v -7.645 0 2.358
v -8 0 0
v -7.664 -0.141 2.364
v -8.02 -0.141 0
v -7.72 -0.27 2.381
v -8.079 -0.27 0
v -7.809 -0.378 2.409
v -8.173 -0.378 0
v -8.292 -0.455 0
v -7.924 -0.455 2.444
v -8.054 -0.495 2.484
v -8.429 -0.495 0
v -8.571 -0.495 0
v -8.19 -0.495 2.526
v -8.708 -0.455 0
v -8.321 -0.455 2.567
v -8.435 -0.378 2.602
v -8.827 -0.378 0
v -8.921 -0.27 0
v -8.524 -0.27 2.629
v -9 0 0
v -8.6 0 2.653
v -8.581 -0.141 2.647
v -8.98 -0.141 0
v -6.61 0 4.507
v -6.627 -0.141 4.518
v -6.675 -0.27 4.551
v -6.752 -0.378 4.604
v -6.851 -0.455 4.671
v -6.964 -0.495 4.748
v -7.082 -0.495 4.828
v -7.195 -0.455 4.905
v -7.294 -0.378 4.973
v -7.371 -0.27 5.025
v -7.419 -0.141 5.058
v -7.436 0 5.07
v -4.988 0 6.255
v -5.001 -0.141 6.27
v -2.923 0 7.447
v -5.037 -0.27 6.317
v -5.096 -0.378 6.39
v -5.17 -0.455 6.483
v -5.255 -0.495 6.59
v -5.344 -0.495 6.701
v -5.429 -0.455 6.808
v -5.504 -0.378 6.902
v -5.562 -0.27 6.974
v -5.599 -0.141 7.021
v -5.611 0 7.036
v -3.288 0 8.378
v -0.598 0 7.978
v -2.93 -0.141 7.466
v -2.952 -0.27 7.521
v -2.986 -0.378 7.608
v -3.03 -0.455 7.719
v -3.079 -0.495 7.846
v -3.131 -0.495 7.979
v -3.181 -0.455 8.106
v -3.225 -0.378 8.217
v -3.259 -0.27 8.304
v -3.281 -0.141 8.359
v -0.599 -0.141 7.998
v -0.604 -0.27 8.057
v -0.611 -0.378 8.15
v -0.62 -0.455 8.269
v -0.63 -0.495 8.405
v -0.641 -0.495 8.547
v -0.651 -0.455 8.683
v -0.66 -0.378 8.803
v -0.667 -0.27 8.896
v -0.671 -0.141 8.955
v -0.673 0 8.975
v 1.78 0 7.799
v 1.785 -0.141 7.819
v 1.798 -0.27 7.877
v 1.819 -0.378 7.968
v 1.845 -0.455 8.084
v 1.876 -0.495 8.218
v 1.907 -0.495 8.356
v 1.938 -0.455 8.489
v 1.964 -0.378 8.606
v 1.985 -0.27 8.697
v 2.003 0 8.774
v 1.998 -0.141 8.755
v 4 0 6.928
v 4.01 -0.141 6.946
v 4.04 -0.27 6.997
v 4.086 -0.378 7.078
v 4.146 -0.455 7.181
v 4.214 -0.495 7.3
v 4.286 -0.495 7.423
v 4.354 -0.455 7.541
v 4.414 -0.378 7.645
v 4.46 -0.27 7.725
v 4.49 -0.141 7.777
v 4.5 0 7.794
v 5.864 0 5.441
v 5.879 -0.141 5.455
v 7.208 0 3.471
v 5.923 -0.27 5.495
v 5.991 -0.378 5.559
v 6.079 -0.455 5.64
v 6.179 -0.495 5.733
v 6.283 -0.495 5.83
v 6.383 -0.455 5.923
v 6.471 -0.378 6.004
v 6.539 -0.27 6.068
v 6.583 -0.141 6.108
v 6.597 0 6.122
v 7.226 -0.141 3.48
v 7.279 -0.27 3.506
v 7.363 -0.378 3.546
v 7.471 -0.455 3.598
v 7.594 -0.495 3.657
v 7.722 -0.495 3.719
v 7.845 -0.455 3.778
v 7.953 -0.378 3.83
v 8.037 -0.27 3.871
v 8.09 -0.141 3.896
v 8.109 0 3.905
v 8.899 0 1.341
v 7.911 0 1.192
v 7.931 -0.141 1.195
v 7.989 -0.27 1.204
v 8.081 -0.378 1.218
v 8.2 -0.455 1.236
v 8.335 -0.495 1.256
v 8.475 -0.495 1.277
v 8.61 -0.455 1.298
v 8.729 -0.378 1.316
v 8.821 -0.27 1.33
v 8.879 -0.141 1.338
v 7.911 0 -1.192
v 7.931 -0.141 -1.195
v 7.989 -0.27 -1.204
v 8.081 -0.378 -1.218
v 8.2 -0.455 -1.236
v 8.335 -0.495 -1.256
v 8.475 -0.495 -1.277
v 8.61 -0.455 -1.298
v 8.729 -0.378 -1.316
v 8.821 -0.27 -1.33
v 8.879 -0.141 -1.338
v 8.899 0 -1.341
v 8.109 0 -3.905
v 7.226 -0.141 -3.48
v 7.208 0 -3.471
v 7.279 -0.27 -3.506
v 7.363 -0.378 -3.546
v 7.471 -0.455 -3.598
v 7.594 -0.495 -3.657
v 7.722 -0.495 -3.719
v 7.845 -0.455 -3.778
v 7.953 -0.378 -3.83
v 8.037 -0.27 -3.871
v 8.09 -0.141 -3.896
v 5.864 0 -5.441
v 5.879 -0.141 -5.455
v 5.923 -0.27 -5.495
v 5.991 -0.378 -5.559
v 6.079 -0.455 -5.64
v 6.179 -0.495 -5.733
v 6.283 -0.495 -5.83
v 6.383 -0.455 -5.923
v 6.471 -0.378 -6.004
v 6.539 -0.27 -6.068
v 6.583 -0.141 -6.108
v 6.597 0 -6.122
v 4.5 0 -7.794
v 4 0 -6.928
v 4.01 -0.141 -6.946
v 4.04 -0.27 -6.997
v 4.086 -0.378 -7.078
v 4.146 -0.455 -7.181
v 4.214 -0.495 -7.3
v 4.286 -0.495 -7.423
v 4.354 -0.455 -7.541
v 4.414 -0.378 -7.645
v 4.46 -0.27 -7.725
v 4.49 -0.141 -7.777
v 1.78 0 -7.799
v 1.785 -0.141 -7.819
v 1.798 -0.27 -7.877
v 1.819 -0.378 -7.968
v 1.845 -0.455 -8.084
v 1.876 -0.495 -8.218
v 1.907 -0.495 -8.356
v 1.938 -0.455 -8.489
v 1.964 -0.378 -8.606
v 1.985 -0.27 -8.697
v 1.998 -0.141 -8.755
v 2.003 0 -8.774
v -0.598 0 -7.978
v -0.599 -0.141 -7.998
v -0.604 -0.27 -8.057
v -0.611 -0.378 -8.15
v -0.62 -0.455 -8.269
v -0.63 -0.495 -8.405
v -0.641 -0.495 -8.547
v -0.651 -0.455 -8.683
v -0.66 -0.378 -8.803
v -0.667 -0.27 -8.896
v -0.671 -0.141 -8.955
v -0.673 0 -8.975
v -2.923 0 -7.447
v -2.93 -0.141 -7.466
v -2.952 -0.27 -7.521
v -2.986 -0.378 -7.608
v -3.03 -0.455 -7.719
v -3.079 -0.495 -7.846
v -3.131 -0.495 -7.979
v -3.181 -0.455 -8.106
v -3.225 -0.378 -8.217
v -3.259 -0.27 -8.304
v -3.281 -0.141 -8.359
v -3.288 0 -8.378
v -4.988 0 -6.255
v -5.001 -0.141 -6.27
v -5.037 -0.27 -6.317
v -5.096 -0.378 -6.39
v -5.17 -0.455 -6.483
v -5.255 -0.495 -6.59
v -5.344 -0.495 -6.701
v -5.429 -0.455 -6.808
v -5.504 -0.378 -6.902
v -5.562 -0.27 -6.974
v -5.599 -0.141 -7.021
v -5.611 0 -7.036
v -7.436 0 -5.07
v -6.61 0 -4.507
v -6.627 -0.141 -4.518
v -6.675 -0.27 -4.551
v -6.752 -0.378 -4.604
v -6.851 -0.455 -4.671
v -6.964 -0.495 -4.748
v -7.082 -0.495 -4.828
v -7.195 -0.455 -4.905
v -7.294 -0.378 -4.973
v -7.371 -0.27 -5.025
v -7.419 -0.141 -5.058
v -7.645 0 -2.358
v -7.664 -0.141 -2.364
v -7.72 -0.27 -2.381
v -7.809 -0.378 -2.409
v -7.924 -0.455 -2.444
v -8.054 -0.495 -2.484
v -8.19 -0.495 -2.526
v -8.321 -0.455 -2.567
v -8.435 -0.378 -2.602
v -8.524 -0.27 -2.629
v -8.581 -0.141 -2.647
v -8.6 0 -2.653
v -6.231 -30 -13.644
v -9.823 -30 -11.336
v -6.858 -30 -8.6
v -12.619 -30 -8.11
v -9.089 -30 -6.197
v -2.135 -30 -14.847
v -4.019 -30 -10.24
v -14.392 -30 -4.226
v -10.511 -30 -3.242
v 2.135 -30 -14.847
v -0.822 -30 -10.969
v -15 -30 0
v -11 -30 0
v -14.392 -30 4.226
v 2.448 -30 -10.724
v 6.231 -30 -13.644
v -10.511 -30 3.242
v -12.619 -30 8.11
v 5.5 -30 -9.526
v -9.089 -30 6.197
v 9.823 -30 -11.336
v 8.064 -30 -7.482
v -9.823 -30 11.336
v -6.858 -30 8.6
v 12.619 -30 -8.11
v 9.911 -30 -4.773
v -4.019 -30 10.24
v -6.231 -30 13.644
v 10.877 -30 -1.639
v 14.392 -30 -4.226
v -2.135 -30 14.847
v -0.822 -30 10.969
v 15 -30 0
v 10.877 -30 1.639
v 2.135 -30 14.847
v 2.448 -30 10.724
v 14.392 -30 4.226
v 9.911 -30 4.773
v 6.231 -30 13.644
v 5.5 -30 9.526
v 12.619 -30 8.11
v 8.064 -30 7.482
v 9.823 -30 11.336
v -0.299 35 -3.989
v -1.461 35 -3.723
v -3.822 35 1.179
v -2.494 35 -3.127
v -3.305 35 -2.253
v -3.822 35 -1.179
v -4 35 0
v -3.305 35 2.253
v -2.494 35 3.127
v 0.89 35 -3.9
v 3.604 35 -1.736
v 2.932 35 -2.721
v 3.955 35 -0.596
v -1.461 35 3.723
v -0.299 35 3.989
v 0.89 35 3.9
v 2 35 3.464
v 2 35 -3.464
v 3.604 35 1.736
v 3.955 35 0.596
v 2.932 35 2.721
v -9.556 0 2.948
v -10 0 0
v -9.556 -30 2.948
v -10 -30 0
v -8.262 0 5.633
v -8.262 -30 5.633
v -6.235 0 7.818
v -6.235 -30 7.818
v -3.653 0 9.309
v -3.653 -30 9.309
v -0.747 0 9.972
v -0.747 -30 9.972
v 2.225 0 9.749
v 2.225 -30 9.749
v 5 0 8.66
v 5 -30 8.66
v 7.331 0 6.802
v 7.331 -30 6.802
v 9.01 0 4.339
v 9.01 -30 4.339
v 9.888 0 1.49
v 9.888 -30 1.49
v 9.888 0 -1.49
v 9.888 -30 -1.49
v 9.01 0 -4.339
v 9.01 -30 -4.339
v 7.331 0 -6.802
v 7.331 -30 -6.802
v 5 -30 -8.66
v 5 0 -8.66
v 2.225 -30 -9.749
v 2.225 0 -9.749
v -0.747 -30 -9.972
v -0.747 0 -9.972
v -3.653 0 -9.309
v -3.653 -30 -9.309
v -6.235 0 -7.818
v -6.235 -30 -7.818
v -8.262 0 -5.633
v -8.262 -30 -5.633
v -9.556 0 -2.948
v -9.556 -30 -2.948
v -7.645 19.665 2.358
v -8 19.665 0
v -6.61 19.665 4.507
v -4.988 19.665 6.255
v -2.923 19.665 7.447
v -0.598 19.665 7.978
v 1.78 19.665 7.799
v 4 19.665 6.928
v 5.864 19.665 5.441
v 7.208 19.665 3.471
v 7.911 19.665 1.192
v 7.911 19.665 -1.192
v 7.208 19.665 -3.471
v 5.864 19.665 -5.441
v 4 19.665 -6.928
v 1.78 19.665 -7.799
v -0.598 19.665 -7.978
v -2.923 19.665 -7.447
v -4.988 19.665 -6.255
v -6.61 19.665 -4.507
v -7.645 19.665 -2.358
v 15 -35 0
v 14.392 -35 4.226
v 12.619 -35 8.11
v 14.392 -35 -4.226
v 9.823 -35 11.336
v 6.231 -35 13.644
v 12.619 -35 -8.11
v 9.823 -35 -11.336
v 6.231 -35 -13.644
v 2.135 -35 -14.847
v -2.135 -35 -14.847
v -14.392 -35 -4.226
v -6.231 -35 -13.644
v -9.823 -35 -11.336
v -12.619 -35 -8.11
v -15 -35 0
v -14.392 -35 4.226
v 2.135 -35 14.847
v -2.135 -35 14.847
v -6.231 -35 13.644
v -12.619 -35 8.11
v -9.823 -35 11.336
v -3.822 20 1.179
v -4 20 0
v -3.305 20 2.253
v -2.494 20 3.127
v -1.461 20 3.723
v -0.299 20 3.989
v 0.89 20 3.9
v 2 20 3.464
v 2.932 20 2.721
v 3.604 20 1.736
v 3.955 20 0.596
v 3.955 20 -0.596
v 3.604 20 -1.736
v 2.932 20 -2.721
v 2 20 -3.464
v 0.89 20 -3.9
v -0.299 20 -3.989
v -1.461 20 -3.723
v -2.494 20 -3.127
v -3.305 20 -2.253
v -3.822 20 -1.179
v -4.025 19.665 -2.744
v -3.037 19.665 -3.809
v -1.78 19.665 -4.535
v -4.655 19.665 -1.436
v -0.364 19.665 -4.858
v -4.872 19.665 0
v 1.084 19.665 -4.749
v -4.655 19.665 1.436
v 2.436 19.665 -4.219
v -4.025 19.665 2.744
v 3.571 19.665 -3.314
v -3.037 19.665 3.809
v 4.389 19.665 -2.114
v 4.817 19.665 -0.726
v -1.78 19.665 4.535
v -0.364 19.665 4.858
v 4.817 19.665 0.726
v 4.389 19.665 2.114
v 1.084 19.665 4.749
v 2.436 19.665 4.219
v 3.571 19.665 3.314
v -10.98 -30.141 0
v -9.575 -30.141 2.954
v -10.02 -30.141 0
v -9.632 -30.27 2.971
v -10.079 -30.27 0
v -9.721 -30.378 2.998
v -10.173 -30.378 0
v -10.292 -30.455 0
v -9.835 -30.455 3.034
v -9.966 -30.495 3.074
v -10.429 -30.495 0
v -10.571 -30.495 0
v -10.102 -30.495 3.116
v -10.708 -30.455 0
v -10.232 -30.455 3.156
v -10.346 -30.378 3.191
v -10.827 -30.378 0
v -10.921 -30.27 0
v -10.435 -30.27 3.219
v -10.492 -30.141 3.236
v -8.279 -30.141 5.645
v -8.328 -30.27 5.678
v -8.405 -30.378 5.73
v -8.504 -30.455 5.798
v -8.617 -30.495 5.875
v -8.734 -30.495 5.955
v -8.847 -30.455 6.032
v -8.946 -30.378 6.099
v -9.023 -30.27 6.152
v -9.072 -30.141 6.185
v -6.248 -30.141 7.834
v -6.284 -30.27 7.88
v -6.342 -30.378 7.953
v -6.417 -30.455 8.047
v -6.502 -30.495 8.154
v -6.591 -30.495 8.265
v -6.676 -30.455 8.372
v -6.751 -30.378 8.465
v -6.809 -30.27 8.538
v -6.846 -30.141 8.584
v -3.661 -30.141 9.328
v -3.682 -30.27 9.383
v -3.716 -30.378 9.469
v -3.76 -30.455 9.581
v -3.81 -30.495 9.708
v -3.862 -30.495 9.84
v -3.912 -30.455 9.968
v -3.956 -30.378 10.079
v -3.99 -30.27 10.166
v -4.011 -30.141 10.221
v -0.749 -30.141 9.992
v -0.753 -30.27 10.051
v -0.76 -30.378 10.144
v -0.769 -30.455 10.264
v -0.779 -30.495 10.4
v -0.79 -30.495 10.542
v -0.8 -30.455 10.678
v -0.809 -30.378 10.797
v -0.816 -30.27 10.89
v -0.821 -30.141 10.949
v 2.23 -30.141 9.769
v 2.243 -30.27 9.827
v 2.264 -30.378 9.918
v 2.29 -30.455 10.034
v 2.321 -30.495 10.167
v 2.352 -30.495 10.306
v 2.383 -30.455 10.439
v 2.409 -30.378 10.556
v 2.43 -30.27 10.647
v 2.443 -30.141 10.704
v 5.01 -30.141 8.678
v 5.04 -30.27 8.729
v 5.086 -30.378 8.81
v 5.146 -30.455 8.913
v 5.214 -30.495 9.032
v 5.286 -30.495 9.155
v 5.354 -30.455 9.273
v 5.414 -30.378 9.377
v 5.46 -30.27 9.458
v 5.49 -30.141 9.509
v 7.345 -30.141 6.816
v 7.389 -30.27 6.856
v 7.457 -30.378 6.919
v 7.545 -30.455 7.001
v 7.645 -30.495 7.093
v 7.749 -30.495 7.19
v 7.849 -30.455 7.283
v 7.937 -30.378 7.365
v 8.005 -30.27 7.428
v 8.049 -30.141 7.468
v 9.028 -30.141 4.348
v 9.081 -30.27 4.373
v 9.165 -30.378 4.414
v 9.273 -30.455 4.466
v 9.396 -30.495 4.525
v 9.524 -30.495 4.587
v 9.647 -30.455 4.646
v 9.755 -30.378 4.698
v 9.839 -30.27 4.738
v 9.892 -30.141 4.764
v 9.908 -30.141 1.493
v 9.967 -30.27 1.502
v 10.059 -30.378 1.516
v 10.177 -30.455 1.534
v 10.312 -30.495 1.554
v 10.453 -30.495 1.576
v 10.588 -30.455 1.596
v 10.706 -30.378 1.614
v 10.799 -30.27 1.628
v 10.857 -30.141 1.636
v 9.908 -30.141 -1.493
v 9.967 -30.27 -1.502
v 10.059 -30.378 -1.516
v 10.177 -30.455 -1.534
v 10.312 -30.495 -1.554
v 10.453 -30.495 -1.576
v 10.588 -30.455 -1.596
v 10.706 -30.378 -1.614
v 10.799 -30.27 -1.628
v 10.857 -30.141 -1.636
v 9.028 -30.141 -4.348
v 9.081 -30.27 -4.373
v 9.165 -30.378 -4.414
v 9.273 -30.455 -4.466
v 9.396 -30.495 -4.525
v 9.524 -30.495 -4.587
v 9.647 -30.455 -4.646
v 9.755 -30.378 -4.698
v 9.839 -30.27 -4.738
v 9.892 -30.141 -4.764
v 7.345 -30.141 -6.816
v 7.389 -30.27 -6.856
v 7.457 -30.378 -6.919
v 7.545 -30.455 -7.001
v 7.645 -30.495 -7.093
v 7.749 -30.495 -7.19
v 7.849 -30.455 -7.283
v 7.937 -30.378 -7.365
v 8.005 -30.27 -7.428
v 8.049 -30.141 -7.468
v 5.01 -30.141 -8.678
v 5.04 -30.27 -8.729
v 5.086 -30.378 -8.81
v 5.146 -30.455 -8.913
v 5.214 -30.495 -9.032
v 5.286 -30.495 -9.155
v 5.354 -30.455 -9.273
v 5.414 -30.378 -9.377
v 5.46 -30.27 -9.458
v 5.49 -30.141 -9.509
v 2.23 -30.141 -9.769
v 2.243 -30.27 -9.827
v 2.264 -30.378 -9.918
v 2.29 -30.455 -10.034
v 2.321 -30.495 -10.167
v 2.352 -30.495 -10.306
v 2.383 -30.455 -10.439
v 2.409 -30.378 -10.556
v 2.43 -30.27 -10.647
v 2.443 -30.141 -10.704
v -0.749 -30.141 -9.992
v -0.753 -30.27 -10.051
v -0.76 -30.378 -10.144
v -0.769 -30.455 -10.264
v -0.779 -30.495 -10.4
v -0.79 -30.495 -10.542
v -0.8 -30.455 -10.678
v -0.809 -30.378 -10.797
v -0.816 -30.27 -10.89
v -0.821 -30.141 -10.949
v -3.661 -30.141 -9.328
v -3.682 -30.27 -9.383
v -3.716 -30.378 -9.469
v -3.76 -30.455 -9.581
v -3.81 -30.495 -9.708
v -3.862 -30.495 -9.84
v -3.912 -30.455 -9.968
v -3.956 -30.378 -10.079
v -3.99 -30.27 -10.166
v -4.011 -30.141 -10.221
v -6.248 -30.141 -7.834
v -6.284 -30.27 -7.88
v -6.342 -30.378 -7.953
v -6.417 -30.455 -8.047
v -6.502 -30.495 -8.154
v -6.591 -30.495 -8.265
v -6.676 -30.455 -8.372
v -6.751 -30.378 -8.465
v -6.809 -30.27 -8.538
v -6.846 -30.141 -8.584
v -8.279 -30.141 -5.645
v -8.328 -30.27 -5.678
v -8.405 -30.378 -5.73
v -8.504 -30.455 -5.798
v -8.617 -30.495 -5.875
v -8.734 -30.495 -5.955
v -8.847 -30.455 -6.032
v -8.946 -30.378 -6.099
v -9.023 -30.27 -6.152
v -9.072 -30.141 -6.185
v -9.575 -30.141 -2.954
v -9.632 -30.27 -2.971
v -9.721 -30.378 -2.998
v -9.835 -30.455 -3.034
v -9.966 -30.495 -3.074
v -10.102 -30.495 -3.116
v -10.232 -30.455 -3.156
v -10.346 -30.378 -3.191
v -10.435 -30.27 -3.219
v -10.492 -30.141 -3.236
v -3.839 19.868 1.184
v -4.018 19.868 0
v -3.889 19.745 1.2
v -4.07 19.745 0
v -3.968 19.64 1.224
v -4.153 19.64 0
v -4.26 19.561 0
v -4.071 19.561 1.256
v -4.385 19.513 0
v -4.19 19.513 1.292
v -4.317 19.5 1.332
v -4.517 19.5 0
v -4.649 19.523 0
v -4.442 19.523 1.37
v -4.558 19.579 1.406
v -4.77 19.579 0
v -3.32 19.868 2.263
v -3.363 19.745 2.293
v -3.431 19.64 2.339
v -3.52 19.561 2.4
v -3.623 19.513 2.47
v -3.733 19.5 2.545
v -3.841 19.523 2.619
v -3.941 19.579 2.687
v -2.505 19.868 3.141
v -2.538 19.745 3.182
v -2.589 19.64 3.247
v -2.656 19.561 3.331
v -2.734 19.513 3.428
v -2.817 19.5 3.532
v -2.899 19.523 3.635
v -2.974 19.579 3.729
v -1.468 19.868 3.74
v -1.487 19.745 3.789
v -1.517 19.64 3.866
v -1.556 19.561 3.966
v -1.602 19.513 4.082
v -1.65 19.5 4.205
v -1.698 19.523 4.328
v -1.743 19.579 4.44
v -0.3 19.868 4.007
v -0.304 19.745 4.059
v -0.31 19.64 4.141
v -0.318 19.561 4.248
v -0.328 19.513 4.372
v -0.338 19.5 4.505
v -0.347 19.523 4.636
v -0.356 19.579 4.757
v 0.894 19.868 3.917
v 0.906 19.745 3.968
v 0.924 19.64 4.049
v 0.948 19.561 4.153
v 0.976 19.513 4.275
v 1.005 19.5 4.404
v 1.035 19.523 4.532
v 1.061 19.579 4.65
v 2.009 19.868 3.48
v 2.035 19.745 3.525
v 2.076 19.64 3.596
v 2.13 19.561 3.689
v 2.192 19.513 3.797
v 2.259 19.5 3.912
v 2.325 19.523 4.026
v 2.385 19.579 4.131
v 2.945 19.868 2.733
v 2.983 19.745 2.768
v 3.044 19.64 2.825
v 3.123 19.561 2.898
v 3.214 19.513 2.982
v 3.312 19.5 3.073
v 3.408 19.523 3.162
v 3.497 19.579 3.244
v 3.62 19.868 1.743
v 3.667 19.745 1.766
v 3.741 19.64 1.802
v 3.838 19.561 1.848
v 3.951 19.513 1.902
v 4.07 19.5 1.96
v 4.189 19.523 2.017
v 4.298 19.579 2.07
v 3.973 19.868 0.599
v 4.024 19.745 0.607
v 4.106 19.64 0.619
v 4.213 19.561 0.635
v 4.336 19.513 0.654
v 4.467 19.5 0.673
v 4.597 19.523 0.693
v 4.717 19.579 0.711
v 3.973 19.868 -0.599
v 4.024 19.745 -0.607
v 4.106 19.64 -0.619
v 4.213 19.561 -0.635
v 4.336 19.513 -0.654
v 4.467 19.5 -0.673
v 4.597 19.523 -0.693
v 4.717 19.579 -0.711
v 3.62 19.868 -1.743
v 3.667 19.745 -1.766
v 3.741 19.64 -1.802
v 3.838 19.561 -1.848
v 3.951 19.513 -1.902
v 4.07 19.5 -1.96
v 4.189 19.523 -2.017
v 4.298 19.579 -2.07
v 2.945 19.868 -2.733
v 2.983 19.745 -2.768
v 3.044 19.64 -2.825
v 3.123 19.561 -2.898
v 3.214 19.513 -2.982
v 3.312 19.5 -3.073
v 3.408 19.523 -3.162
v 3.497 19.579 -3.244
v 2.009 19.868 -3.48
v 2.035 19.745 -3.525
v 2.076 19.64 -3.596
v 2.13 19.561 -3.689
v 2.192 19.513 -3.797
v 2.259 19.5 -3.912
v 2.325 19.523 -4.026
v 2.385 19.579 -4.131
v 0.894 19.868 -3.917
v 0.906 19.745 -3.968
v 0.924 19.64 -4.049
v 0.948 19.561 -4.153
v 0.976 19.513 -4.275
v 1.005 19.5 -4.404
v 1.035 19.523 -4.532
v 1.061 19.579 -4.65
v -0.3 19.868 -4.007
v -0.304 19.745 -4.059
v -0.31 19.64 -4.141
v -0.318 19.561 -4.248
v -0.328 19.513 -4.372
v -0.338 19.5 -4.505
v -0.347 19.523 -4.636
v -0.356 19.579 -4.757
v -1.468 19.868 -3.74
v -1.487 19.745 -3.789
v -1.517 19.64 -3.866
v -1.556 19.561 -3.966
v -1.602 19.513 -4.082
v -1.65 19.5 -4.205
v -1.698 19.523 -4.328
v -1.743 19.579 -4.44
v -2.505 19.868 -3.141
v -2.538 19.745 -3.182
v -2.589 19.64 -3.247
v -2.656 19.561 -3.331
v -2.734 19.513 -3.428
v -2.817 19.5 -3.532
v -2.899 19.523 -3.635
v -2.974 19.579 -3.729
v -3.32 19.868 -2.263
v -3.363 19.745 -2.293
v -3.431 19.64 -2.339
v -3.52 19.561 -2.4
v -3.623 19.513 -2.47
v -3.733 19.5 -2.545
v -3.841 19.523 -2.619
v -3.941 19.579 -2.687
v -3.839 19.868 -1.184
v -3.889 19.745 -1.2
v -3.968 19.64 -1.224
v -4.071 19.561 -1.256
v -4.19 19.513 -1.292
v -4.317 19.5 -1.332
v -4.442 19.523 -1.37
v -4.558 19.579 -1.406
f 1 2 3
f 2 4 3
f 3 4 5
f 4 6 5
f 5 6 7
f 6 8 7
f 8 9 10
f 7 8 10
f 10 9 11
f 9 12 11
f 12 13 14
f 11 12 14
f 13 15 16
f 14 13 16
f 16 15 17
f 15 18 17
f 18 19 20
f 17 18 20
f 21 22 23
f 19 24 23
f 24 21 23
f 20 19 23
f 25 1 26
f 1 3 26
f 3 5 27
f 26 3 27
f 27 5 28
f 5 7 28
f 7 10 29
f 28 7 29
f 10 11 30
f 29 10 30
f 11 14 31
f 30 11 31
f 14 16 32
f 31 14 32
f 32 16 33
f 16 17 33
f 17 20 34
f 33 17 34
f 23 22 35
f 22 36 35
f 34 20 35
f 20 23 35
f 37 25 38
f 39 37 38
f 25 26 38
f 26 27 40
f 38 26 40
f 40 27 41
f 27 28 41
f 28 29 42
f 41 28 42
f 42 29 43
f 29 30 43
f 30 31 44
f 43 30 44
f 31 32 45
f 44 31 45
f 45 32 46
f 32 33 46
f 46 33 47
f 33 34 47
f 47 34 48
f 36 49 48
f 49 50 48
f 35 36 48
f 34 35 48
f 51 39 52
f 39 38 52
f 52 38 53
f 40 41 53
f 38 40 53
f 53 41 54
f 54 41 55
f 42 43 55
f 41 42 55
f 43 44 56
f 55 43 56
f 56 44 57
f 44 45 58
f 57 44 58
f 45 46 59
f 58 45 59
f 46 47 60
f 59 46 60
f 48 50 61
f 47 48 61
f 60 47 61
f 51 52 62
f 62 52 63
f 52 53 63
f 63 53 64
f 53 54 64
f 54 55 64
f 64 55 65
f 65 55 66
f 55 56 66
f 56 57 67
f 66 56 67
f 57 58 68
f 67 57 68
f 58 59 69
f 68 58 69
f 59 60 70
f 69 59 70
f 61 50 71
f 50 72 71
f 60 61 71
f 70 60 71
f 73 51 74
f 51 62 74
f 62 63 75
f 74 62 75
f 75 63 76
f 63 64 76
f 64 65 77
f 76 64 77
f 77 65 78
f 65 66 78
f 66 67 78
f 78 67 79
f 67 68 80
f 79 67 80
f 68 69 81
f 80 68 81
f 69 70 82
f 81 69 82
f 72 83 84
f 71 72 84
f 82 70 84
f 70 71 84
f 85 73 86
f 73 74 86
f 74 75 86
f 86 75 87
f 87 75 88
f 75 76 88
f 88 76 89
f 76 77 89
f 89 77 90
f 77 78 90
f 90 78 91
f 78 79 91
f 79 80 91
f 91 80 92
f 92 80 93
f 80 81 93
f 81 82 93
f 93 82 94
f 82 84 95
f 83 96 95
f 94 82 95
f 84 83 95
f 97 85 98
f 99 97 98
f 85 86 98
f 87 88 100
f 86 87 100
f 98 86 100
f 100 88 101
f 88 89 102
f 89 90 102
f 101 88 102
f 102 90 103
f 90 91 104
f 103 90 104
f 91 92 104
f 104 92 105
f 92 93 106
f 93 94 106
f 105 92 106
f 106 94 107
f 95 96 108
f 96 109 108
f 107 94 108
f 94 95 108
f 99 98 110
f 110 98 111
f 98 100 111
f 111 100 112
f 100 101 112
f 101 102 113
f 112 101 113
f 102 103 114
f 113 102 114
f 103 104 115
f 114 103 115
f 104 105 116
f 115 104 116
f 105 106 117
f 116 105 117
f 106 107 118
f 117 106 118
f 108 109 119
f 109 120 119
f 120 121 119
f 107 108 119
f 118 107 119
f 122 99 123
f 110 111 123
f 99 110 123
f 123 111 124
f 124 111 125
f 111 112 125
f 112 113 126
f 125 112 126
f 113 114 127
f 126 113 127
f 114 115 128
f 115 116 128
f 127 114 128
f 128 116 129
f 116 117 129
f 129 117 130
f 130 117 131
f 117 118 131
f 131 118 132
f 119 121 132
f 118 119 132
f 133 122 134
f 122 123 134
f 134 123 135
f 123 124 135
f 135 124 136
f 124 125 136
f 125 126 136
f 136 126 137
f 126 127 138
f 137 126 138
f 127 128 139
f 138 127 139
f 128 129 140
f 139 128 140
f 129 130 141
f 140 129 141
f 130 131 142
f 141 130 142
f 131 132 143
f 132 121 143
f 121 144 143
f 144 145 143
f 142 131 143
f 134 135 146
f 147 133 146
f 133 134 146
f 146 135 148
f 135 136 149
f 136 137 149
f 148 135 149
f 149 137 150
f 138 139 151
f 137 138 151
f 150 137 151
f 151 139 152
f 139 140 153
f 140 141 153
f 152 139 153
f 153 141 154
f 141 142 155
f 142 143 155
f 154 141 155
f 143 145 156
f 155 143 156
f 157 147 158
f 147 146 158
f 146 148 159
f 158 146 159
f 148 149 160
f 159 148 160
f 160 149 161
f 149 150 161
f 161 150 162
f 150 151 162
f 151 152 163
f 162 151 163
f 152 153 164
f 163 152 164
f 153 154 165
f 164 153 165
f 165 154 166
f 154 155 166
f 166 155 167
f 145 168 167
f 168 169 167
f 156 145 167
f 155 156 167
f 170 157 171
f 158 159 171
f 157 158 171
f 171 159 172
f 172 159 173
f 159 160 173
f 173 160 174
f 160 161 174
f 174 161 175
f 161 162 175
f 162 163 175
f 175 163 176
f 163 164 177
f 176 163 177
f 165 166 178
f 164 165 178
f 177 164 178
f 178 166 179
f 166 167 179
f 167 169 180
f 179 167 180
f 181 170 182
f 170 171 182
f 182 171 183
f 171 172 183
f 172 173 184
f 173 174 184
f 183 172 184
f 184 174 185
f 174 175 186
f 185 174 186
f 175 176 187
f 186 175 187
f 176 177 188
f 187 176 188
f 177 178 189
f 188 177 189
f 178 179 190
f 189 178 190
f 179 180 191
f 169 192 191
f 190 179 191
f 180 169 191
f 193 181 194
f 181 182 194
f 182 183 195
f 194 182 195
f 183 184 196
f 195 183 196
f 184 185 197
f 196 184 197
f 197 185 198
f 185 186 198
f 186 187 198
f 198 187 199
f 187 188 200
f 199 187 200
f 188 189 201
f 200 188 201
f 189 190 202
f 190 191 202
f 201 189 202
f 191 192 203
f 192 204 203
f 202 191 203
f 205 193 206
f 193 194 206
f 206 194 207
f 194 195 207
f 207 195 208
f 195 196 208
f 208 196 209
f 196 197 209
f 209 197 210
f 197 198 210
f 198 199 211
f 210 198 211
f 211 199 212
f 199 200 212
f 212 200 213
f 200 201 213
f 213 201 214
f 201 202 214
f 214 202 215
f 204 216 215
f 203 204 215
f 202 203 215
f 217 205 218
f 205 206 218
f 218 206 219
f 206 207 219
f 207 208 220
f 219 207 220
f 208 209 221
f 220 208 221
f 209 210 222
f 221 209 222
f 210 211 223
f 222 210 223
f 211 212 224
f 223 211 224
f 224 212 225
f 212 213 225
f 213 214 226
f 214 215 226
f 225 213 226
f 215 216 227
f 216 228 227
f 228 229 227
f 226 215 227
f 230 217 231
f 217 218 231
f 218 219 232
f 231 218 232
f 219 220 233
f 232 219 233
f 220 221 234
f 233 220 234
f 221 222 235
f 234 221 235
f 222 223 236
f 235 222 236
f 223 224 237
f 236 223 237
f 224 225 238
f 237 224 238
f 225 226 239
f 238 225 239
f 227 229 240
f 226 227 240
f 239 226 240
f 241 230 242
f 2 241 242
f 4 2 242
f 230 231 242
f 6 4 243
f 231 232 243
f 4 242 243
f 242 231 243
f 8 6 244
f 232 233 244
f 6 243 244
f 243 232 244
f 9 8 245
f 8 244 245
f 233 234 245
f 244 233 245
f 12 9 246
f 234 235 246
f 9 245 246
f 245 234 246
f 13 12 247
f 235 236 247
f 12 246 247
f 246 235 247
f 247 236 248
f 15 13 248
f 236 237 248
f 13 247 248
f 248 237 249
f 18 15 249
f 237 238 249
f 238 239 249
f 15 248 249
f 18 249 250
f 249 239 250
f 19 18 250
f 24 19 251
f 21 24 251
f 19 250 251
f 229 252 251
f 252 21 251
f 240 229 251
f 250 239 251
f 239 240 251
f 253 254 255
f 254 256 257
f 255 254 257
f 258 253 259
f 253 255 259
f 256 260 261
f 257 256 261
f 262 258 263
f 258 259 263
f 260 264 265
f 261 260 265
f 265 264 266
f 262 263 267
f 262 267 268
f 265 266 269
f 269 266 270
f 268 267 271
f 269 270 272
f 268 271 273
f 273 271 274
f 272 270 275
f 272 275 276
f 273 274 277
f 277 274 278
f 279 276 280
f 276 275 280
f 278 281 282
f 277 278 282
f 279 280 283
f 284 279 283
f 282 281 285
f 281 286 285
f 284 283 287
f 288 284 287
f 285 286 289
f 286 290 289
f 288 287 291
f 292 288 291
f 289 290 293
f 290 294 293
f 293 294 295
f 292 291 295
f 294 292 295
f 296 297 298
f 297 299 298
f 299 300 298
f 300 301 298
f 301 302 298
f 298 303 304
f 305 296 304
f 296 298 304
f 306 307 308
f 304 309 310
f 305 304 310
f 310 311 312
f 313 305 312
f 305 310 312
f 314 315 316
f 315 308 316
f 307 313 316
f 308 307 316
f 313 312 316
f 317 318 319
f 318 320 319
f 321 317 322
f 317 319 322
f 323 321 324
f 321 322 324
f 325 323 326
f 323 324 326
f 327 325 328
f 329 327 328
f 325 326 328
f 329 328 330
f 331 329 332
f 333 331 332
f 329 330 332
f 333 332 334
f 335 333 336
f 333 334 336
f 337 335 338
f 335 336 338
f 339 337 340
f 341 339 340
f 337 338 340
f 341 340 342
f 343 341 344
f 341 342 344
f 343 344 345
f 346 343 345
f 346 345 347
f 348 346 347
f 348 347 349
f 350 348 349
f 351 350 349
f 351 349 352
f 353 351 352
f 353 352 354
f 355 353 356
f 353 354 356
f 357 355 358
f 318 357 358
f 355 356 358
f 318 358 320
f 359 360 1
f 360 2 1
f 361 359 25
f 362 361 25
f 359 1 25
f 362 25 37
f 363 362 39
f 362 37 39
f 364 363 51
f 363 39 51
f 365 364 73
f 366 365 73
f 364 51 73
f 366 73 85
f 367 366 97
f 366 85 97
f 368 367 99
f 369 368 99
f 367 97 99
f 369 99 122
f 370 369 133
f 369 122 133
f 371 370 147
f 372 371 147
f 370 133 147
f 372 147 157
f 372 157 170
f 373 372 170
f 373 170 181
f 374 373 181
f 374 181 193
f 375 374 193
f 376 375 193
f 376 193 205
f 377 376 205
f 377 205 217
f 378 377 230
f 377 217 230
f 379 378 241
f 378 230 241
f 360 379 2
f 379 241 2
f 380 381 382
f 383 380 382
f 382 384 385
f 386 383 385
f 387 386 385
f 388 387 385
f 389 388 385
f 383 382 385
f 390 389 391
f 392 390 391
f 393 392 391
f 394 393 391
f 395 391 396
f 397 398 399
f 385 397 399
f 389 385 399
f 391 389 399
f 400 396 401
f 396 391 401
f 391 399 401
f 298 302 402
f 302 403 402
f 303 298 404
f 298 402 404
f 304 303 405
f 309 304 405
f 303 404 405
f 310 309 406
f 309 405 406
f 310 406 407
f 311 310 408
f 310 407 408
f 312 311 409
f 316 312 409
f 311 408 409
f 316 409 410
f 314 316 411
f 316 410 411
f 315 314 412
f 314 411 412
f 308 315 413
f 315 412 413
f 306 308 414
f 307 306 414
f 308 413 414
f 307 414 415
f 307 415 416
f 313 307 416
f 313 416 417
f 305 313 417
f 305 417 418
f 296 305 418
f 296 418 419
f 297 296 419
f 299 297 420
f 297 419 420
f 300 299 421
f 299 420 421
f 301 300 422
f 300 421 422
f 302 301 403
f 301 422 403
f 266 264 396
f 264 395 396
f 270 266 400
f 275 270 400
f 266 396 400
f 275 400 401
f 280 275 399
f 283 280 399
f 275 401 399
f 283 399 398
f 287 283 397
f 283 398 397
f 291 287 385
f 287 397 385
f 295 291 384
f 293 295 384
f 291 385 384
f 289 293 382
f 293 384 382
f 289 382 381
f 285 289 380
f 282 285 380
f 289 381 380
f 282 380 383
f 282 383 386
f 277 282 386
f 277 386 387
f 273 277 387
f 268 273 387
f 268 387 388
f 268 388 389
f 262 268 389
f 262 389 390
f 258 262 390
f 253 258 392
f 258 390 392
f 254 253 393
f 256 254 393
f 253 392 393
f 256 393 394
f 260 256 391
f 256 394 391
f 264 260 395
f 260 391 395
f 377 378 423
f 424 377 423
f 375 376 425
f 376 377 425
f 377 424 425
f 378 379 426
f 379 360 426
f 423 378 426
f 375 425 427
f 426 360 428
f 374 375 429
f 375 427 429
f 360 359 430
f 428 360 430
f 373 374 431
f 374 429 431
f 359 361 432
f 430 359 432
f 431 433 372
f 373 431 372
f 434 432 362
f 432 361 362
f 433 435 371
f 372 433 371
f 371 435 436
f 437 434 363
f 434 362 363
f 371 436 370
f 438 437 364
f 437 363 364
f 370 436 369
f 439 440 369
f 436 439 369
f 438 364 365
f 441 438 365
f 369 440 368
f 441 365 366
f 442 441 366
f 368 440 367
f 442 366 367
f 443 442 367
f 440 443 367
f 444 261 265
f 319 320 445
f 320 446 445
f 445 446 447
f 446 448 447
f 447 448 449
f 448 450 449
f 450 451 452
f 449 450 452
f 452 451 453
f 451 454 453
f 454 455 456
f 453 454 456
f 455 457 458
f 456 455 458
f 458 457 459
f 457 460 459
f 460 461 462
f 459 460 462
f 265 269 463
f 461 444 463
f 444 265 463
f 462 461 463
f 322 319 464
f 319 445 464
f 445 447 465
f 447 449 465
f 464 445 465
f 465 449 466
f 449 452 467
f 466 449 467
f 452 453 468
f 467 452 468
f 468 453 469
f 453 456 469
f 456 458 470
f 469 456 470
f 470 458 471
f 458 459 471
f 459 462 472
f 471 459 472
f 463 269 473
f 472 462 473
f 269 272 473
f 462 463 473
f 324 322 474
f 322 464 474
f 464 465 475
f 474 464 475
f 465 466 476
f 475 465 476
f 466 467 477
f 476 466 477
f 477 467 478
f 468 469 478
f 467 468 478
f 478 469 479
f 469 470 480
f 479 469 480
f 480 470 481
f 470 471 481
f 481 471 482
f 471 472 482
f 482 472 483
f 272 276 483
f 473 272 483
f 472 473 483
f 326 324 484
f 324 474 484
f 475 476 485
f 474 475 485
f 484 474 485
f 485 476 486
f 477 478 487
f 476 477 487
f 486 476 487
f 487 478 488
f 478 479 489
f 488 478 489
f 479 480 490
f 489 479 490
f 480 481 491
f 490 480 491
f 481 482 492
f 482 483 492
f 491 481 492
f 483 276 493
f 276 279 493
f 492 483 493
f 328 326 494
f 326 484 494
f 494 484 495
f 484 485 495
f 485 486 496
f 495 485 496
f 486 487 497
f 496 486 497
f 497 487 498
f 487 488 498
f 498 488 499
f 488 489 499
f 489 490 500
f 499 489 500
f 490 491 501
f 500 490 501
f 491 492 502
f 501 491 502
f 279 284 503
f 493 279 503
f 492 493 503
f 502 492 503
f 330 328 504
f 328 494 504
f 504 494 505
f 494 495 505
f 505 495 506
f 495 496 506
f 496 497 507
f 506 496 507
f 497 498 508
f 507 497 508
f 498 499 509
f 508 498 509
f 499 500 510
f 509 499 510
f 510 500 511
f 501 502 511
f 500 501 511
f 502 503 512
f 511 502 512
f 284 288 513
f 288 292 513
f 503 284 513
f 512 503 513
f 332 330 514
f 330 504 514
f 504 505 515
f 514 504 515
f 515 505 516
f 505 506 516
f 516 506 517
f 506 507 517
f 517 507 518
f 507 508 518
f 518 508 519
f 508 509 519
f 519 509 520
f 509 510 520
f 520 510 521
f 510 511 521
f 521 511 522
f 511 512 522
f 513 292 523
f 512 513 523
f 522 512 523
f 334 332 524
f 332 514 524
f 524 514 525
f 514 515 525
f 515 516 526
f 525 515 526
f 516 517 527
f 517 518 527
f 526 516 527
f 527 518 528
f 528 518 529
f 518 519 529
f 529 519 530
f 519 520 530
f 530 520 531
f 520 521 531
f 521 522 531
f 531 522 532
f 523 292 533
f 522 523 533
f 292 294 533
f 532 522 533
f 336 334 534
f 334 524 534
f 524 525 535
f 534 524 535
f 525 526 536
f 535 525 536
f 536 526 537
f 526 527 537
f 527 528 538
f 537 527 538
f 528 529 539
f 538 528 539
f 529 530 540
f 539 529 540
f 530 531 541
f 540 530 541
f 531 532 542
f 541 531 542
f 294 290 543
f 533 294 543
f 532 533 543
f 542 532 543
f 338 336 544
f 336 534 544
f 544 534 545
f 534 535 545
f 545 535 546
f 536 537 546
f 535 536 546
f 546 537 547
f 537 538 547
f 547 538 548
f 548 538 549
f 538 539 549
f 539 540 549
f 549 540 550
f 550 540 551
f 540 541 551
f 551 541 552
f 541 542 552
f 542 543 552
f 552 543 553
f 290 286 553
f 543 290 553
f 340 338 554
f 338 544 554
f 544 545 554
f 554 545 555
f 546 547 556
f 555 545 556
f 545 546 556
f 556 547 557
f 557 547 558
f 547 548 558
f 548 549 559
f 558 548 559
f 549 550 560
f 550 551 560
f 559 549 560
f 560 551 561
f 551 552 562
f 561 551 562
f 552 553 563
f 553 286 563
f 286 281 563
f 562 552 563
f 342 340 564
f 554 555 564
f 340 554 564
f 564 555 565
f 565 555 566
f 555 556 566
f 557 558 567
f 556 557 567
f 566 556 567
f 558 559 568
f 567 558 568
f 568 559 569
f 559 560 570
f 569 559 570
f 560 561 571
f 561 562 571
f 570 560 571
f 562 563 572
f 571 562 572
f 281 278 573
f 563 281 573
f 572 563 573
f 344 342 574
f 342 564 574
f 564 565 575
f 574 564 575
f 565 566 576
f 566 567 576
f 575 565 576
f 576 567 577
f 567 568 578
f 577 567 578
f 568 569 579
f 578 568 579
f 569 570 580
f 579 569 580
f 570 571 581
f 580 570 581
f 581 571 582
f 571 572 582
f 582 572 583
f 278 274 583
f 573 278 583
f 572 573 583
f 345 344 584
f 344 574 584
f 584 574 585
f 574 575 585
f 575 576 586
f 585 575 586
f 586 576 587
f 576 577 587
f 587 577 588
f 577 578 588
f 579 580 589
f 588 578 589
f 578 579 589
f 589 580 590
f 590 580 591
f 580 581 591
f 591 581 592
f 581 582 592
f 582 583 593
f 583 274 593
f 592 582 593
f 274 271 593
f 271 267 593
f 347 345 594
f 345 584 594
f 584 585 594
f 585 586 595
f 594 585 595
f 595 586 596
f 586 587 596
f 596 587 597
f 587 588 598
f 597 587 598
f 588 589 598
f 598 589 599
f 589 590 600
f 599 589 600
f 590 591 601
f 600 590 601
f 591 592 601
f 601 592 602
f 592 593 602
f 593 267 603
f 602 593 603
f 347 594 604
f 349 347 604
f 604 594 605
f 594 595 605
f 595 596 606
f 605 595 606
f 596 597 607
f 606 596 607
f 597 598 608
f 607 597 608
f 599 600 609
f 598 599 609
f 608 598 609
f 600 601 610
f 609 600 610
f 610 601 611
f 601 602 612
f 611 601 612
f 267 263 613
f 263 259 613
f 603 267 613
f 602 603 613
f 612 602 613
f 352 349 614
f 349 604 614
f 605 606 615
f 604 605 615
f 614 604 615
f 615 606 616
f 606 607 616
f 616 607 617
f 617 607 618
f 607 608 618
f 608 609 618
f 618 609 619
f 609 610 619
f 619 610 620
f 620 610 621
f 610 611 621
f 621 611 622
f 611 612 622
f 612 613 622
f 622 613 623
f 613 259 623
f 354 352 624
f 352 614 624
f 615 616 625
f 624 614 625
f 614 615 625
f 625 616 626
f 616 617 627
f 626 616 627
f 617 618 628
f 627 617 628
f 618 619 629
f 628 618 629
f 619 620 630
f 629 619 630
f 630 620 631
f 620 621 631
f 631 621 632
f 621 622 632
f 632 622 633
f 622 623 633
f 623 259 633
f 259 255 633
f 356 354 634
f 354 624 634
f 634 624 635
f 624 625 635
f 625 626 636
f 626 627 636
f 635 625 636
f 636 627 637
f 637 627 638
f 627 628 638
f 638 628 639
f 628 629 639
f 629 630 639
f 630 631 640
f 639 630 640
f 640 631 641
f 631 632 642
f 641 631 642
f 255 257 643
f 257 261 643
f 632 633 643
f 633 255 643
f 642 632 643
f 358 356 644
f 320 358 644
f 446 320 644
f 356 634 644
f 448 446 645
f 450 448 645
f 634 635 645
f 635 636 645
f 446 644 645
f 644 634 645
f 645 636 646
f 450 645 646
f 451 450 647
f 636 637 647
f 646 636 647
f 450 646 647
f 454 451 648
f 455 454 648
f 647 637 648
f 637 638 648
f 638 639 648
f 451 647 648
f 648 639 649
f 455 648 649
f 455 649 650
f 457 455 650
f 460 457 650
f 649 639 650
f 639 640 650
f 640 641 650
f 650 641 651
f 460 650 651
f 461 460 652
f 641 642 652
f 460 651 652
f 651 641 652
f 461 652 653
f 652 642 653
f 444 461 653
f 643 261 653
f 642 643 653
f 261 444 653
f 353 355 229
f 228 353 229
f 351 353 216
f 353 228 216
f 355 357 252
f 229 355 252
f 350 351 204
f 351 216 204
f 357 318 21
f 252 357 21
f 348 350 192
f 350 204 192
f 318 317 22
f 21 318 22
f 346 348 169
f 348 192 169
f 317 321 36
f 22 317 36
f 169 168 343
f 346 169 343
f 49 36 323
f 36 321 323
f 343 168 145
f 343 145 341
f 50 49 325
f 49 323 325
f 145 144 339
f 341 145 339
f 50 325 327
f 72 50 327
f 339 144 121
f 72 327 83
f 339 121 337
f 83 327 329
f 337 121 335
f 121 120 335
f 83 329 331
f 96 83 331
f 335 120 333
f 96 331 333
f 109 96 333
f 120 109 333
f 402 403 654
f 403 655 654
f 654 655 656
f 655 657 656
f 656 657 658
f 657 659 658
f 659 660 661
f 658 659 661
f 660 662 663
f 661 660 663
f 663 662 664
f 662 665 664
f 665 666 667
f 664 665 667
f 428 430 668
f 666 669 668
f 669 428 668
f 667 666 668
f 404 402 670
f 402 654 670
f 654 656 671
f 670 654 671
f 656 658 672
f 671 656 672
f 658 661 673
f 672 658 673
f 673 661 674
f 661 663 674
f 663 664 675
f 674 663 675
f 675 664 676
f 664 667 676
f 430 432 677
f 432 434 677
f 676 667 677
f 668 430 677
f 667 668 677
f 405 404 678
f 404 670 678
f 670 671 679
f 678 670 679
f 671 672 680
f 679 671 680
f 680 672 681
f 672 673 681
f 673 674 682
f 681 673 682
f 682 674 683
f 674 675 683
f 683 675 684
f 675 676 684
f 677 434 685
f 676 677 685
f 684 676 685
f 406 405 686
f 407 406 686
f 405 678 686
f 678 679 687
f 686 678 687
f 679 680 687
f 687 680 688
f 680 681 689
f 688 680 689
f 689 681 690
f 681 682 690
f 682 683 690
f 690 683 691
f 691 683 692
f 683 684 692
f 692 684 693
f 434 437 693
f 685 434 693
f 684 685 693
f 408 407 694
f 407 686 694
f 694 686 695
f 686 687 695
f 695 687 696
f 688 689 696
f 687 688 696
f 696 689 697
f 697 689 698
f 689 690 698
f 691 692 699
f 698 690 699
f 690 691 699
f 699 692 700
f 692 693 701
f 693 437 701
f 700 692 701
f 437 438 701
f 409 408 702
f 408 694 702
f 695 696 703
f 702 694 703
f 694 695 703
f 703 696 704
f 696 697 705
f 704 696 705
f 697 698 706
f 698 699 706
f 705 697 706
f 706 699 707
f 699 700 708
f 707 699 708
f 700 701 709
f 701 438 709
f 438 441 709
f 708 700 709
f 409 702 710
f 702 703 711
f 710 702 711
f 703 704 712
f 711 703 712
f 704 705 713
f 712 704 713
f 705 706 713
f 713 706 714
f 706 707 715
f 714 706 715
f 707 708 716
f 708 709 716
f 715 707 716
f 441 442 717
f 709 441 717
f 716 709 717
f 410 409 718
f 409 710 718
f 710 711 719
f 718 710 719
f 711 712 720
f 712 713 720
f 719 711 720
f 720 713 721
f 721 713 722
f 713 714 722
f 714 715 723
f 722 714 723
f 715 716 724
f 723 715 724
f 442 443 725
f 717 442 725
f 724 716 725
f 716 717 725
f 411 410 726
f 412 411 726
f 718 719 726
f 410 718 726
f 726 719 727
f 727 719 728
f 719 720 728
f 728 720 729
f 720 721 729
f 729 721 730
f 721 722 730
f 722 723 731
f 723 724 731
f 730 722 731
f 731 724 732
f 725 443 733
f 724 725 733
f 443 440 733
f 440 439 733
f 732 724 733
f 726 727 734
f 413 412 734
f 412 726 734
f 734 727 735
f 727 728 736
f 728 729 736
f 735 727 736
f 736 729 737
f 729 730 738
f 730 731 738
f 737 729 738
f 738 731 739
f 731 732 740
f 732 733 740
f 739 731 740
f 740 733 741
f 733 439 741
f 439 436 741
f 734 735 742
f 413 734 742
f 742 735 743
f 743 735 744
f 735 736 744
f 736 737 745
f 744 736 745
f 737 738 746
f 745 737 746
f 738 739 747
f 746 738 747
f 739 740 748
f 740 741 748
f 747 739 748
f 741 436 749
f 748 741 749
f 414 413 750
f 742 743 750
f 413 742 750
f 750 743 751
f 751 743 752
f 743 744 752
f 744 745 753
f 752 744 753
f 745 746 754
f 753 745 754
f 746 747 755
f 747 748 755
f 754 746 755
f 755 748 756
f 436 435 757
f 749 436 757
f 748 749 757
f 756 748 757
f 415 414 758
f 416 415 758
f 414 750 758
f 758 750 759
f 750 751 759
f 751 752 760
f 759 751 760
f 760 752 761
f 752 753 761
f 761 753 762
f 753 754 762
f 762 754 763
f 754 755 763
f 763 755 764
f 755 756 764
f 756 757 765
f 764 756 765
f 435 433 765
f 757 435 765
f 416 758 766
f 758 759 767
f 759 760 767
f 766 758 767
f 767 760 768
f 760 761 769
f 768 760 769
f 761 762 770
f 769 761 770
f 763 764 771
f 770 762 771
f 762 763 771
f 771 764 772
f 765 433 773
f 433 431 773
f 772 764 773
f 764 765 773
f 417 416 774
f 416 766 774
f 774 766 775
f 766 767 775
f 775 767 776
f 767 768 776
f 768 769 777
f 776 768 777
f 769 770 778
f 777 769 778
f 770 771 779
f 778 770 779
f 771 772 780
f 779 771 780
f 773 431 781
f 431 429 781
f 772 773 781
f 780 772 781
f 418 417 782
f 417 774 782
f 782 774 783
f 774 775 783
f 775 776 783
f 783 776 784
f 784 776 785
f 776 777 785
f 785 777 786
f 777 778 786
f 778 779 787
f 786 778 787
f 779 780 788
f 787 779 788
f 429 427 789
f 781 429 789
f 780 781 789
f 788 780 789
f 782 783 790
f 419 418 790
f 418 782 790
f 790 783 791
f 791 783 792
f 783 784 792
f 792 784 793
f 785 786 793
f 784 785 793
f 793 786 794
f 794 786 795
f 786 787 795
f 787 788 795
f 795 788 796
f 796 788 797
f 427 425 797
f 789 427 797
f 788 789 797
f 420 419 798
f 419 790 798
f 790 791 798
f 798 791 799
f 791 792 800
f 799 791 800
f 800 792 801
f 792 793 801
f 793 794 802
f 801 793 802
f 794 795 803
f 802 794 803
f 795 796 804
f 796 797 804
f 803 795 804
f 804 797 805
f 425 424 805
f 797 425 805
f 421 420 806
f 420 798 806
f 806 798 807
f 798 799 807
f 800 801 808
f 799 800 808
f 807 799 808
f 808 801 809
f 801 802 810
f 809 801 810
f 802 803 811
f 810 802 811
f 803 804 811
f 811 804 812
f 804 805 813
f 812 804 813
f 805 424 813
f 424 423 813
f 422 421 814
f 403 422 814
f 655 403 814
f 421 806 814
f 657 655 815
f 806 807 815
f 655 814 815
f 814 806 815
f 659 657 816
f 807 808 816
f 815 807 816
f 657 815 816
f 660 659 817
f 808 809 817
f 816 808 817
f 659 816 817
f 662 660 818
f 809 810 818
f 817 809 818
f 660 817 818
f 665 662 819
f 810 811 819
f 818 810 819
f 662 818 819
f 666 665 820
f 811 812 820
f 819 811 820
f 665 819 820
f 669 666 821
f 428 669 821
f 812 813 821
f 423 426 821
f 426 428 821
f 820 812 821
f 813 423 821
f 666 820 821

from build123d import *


with BuildPart() as part:
    # Sketch1 → Revolve1 (revolve)
    with BuildSketch(Plane.XY):
        with BuildLine():
            Line((-9, 0), (-10, 0))
            Line((-10, 0), (-10, -30))
            ThreePointArc((-10, -30), (-10.5, -30.5), (-11, -30))
            Line((-11, -30), (-15, -30))
            Line((-15, -30), (-15, -35))
            Line((-15, -35), (0, -35))
            Line((0, -35), (0, -30))
            Line((0, -30), (0, 0))
            Line((0, 0), (0, 20))
            Line((0, 20), (0, 35))
            Line((0, 35), (-4, 35))
            Line((-4, 35), (-4, 20))
            ThreePointArc((-4, 20), (-4.320844675, 19.53319879), (-4.871613477, 19.665480309))
            Line((-4.871613477, 19.665480309), (-8, 19.665480309))
            Line((-8, 19.665480309), (-8, 0))
            ThreePointArc((-8, 0), (-8.5, -0.5), (-9, 0))
        make_face()
    revolve(axis=Axis((0, 0, 0), (0, 1, 0)))


solid = part.part
